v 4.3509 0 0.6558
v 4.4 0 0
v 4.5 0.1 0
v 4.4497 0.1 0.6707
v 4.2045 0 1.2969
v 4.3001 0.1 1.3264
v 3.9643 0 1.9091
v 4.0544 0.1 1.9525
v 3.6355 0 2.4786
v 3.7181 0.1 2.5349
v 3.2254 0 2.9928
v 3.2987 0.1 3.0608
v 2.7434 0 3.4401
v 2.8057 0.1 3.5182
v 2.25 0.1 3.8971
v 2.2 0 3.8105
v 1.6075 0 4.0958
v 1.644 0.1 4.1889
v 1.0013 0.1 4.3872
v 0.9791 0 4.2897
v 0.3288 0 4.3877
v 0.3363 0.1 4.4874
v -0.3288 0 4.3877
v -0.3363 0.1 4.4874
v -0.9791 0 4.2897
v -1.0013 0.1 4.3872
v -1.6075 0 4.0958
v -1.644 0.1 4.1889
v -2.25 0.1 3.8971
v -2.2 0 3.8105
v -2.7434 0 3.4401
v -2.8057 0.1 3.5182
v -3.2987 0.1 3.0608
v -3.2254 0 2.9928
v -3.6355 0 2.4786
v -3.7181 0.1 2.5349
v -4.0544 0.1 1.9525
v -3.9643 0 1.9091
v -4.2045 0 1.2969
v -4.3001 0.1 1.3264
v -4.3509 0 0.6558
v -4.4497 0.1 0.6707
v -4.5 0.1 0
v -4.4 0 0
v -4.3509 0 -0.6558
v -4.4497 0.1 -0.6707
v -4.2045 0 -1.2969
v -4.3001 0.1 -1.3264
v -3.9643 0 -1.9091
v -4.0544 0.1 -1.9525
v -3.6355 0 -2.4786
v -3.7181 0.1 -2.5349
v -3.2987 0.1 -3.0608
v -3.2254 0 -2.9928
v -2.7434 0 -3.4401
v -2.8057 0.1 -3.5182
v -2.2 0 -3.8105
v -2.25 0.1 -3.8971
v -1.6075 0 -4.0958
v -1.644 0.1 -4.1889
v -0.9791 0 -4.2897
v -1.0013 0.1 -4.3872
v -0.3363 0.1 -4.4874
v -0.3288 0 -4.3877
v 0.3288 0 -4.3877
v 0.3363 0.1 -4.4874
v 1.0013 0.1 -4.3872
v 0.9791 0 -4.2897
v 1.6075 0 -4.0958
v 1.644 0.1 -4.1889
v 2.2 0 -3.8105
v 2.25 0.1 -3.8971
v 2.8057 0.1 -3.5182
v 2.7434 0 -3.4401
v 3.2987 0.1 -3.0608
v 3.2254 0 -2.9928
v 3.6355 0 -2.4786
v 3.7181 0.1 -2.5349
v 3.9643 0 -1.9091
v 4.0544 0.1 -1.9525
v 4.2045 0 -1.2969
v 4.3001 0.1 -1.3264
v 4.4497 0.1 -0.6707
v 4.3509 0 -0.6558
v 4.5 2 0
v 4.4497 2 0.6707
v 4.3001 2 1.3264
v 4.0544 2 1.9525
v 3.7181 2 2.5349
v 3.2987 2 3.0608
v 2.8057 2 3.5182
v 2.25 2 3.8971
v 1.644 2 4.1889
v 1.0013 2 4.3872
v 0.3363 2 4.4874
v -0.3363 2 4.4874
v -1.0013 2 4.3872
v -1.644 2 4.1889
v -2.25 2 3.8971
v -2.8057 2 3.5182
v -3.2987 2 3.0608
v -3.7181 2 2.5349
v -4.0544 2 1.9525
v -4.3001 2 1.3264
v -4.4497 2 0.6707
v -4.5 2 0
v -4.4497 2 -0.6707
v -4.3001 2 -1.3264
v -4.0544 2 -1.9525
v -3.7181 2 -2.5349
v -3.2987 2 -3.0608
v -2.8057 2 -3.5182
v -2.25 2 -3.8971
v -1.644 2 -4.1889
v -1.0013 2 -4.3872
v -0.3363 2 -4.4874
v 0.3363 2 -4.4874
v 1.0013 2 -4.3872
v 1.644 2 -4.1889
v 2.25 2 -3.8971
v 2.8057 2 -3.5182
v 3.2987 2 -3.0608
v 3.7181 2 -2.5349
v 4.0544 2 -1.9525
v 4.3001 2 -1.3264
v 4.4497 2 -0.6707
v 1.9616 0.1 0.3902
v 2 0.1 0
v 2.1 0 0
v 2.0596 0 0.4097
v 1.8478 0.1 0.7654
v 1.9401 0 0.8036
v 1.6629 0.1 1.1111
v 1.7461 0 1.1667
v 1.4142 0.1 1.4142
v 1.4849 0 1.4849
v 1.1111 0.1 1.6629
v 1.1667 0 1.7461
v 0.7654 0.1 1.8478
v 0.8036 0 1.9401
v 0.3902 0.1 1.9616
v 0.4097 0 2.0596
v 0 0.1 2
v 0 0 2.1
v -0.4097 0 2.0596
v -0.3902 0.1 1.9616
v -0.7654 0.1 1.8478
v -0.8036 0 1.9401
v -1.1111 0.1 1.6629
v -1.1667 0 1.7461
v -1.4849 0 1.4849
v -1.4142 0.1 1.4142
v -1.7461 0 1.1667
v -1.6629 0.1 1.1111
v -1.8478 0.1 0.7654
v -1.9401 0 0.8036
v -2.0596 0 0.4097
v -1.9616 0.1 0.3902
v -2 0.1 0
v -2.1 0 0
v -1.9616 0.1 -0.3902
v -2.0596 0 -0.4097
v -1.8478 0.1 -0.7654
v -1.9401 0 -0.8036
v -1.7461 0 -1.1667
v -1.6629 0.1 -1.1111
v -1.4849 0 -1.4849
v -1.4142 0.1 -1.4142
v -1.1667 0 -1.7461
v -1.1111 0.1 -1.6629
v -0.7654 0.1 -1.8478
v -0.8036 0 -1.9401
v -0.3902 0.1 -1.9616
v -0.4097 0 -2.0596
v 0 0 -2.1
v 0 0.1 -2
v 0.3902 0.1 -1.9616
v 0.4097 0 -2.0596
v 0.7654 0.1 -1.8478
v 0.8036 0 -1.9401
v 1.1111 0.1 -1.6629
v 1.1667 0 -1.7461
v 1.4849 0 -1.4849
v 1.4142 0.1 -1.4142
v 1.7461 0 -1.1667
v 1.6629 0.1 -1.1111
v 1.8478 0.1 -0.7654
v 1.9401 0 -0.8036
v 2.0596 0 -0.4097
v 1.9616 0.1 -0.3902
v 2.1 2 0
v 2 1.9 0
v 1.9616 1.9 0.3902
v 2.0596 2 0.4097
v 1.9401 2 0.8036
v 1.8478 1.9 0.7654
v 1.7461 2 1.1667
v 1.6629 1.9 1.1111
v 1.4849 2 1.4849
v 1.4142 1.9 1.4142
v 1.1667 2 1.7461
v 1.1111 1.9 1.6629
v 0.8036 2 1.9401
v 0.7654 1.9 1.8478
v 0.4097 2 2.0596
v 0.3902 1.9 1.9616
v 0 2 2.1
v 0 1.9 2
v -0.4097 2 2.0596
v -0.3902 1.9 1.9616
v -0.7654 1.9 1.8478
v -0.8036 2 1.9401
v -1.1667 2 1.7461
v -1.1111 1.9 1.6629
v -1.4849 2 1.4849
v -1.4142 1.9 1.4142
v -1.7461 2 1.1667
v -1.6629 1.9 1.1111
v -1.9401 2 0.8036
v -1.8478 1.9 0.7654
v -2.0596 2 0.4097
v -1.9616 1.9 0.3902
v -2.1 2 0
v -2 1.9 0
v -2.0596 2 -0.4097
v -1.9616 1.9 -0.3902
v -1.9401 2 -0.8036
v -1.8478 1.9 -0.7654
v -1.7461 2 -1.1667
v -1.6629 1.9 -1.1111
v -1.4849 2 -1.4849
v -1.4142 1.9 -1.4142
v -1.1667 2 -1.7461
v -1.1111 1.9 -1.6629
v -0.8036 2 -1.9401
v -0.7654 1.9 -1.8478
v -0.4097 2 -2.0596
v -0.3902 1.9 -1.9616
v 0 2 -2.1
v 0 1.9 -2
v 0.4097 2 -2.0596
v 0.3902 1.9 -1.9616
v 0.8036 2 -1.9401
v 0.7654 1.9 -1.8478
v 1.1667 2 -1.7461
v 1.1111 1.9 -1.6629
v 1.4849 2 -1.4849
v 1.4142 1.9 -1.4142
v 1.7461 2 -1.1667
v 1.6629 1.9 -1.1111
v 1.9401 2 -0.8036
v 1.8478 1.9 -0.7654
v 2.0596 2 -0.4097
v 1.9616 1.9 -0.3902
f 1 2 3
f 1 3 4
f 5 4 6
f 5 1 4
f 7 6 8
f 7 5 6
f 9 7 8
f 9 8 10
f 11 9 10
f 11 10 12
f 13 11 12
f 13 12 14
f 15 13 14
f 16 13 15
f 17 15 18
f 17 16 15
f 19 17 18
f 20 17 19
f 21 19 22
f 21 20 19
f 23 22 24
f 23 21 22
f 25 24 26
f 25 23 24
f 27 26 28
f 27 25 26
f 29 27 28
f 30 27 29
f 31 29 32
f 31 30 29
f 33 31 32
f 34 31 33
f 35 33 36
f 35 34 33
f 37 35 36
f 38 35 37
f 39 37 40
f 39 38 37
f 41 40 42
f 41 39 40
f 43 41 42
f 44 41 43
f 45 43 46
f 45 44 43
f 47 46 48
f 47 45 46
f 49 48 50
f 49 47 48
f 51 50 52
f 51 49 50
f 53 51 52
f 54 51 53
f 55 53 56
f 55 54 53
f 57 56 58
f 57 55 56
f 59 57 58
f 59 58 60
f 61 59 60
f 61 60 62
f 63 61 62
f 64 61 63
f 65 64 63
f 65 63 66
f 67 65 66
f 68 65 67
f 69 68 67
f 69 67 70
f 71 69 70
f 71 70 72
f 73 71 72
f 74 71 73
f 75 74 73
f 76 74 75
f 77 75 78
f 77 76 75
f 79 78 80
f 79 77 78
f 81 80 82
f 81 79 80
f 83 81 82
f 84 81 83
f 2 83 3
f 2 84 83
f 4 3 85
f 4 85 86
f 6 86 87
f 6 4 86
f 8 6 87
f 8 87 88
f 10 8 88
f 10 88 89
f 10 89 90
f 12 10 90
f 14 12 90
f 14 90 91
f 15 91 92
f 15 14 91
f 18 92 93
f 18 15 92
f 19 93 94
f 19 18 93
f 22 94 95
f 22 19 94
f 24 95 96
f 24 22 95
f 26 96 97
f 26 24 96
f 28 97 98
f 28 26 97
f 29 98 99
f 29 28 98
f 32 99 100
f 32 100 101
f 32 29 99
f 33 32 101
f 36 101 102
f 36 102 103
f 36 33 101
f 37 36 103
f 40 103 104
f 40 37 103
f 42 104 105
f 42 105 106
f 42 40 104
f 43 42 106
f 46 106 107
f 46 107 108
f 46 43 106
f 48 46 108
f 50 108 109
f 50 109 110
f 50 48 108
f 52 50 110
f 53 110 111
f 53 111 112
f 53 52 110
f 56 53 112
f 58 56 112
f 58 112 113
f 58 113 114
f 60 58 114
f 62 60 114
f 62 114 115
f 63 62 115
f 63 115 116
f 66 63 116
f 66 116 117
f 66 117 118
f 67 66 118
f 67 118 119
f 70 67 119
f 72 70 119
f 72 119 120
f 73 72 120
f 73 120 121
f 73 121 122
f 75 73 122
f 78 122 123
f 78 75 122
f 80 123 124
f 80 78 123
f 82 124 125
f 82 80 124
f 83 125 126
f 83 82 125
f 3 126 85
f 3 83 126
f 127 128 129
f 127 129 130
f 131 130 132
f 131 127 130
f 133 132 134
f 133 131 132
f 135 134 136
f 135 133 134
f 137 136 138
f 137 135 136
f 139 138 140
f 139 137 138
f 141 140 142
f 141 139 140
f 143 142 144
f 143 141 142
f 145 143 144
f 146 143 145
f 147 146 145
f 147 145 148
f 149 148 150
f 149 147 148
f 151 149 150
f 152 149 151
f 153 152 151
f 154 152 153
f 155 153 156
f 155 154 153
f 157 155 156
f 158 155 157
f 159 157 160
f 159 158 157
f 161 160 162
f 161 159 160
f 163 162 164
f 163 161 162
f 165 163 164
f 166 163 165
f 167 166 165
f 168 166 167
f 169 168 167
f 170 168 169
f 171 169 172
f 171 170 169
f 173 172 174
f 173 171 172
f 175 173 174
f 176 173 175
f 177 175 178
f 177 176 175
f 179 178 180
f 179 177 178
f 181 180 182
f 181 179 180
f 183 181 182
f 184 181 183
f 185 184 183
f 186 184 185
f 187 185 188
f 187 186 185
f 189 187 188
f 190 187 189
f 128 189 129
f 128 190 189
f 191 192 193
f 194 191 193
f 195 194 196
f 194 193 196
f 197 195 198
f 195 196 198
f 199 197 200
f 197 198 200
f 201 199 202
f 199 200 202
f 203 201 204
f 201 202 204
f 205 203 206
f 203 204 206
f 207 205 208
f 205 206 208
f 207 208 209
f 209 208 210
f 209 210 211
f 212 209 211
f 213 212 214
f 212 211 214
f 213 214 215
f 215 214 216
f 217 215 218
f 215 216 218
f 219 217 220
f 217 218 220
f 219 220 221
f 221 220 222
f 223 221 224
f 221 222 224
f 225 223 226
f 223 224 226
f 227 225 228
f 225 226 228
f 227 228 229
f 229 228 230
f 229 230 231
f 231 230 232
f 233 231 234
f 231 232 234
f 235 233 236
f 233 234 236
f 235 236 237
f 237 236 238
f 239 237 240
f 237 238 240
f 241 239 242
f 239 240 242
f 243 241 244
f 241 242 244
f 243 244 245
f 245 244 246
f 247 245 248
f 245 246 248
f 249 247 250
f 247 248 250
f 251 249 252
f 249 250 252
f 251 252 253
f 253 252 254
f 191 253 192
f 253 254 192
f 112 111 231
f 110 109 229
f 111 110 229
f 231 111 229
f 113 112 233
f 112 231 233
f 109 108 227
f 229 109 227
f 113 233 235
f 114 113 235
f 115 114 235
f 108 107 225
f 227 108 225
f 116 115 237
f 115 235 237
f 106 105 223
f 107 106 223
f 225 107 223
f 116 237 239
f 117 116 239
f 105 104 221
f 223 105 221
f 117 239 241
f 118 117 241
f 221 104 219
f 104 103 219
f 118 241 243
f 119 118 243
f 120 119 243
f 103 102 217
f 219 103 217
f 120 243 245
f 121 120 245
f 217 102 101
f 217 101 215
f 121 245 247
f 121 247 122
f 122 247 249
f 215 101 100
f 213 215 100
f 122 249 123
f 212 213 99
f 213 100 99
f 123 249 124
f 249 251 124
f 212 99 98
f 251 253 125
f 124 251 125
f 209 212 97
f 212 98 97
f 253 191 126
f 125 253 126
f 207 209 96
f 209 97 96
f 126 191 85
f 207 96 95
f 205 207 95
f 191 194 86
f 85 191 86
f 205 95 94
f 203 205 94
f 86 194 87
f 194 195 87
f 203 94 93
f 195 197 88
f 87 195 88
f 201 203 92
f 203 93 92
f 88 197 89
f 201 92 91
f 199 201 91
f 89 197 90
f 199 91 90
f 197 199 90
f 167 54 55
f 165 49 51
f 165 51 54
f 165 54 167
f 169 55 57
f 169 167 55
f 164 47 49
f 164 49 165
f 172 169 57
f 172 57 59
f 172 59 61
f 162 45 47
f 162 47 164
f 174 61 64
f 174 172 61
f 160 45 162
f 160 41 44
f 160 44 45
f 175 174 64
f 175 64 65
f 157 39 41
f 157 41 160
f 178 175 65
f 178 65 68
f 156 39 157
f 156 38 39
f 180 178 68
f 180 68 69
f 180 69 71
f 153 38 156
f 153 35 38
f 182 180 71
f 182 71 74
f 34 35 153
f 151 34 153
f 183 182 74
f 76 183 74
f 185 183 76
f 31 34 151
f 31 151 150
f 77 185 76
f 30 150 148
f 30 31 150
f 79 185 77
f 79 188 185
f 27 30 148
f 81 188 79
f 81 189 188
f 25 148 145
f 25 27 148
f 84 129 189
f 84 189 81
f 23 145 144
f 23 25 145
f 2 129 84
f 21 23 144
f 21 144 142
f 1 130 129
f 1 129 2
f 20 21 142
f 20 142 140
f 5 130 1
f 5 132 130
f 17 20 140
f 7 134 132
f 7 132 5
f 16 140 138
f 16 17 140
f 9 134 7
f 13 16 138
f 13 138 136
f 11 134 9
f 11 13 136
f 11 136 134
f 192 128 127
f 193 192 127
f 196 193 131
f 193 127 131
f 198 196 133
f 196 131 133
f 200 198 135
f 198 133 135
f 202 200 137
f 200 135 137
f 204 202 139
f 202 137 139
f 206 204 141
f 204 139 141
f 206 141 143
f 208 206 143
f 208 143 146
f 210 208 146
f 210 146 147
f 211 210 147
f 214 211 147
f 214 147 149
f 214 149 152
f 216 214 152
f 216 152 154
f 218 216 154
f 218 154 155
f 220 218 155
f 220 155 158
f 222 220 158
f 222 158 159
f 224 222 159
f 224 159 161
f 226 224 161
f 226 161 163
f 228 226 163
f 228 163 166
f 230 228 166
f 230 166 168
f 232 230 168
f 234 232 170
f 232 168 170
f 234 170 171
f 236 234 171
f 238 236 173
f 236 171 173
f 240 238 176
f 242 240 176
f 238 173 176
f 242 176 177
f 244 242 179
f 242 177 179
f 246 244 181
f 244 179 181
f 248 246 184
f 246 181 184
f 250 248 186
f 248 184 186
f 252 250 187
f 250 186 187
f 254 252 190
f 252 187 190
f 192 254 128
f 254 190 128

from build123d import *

# Parameters (mm, degrees)
F0_R     = 4.5
F1_DEPTH = 2
F2_R     = 2
F3_DEPTH = 2.001
F4_SIZE  = 0.1


with BuildPart() as f1:
    # F0 (on Front) → F1 (new body)
    with BuildSketch(Plane.XZ):
        Circle(F0_R)
    extrude(amount=-F1_DEPTH)

    # F2 (on face) → F3 (cut, through all)
    with BuildSketch(Plane.XZ):
        Circle(F2_R)
    extrude(amount=-F3_DEPTH, mode=Mode.SUBTRACT)

    # F4
    f4_edges = [f1.edges().sort_by_distance(p)[0] for p in [
        (-2, 0, 0),
        (-4.5, 0, 0),
        (-2, 2, 0),
    ]]
    chamfer(f4_edges, length=F4_SIZE)


solid = f1.part
